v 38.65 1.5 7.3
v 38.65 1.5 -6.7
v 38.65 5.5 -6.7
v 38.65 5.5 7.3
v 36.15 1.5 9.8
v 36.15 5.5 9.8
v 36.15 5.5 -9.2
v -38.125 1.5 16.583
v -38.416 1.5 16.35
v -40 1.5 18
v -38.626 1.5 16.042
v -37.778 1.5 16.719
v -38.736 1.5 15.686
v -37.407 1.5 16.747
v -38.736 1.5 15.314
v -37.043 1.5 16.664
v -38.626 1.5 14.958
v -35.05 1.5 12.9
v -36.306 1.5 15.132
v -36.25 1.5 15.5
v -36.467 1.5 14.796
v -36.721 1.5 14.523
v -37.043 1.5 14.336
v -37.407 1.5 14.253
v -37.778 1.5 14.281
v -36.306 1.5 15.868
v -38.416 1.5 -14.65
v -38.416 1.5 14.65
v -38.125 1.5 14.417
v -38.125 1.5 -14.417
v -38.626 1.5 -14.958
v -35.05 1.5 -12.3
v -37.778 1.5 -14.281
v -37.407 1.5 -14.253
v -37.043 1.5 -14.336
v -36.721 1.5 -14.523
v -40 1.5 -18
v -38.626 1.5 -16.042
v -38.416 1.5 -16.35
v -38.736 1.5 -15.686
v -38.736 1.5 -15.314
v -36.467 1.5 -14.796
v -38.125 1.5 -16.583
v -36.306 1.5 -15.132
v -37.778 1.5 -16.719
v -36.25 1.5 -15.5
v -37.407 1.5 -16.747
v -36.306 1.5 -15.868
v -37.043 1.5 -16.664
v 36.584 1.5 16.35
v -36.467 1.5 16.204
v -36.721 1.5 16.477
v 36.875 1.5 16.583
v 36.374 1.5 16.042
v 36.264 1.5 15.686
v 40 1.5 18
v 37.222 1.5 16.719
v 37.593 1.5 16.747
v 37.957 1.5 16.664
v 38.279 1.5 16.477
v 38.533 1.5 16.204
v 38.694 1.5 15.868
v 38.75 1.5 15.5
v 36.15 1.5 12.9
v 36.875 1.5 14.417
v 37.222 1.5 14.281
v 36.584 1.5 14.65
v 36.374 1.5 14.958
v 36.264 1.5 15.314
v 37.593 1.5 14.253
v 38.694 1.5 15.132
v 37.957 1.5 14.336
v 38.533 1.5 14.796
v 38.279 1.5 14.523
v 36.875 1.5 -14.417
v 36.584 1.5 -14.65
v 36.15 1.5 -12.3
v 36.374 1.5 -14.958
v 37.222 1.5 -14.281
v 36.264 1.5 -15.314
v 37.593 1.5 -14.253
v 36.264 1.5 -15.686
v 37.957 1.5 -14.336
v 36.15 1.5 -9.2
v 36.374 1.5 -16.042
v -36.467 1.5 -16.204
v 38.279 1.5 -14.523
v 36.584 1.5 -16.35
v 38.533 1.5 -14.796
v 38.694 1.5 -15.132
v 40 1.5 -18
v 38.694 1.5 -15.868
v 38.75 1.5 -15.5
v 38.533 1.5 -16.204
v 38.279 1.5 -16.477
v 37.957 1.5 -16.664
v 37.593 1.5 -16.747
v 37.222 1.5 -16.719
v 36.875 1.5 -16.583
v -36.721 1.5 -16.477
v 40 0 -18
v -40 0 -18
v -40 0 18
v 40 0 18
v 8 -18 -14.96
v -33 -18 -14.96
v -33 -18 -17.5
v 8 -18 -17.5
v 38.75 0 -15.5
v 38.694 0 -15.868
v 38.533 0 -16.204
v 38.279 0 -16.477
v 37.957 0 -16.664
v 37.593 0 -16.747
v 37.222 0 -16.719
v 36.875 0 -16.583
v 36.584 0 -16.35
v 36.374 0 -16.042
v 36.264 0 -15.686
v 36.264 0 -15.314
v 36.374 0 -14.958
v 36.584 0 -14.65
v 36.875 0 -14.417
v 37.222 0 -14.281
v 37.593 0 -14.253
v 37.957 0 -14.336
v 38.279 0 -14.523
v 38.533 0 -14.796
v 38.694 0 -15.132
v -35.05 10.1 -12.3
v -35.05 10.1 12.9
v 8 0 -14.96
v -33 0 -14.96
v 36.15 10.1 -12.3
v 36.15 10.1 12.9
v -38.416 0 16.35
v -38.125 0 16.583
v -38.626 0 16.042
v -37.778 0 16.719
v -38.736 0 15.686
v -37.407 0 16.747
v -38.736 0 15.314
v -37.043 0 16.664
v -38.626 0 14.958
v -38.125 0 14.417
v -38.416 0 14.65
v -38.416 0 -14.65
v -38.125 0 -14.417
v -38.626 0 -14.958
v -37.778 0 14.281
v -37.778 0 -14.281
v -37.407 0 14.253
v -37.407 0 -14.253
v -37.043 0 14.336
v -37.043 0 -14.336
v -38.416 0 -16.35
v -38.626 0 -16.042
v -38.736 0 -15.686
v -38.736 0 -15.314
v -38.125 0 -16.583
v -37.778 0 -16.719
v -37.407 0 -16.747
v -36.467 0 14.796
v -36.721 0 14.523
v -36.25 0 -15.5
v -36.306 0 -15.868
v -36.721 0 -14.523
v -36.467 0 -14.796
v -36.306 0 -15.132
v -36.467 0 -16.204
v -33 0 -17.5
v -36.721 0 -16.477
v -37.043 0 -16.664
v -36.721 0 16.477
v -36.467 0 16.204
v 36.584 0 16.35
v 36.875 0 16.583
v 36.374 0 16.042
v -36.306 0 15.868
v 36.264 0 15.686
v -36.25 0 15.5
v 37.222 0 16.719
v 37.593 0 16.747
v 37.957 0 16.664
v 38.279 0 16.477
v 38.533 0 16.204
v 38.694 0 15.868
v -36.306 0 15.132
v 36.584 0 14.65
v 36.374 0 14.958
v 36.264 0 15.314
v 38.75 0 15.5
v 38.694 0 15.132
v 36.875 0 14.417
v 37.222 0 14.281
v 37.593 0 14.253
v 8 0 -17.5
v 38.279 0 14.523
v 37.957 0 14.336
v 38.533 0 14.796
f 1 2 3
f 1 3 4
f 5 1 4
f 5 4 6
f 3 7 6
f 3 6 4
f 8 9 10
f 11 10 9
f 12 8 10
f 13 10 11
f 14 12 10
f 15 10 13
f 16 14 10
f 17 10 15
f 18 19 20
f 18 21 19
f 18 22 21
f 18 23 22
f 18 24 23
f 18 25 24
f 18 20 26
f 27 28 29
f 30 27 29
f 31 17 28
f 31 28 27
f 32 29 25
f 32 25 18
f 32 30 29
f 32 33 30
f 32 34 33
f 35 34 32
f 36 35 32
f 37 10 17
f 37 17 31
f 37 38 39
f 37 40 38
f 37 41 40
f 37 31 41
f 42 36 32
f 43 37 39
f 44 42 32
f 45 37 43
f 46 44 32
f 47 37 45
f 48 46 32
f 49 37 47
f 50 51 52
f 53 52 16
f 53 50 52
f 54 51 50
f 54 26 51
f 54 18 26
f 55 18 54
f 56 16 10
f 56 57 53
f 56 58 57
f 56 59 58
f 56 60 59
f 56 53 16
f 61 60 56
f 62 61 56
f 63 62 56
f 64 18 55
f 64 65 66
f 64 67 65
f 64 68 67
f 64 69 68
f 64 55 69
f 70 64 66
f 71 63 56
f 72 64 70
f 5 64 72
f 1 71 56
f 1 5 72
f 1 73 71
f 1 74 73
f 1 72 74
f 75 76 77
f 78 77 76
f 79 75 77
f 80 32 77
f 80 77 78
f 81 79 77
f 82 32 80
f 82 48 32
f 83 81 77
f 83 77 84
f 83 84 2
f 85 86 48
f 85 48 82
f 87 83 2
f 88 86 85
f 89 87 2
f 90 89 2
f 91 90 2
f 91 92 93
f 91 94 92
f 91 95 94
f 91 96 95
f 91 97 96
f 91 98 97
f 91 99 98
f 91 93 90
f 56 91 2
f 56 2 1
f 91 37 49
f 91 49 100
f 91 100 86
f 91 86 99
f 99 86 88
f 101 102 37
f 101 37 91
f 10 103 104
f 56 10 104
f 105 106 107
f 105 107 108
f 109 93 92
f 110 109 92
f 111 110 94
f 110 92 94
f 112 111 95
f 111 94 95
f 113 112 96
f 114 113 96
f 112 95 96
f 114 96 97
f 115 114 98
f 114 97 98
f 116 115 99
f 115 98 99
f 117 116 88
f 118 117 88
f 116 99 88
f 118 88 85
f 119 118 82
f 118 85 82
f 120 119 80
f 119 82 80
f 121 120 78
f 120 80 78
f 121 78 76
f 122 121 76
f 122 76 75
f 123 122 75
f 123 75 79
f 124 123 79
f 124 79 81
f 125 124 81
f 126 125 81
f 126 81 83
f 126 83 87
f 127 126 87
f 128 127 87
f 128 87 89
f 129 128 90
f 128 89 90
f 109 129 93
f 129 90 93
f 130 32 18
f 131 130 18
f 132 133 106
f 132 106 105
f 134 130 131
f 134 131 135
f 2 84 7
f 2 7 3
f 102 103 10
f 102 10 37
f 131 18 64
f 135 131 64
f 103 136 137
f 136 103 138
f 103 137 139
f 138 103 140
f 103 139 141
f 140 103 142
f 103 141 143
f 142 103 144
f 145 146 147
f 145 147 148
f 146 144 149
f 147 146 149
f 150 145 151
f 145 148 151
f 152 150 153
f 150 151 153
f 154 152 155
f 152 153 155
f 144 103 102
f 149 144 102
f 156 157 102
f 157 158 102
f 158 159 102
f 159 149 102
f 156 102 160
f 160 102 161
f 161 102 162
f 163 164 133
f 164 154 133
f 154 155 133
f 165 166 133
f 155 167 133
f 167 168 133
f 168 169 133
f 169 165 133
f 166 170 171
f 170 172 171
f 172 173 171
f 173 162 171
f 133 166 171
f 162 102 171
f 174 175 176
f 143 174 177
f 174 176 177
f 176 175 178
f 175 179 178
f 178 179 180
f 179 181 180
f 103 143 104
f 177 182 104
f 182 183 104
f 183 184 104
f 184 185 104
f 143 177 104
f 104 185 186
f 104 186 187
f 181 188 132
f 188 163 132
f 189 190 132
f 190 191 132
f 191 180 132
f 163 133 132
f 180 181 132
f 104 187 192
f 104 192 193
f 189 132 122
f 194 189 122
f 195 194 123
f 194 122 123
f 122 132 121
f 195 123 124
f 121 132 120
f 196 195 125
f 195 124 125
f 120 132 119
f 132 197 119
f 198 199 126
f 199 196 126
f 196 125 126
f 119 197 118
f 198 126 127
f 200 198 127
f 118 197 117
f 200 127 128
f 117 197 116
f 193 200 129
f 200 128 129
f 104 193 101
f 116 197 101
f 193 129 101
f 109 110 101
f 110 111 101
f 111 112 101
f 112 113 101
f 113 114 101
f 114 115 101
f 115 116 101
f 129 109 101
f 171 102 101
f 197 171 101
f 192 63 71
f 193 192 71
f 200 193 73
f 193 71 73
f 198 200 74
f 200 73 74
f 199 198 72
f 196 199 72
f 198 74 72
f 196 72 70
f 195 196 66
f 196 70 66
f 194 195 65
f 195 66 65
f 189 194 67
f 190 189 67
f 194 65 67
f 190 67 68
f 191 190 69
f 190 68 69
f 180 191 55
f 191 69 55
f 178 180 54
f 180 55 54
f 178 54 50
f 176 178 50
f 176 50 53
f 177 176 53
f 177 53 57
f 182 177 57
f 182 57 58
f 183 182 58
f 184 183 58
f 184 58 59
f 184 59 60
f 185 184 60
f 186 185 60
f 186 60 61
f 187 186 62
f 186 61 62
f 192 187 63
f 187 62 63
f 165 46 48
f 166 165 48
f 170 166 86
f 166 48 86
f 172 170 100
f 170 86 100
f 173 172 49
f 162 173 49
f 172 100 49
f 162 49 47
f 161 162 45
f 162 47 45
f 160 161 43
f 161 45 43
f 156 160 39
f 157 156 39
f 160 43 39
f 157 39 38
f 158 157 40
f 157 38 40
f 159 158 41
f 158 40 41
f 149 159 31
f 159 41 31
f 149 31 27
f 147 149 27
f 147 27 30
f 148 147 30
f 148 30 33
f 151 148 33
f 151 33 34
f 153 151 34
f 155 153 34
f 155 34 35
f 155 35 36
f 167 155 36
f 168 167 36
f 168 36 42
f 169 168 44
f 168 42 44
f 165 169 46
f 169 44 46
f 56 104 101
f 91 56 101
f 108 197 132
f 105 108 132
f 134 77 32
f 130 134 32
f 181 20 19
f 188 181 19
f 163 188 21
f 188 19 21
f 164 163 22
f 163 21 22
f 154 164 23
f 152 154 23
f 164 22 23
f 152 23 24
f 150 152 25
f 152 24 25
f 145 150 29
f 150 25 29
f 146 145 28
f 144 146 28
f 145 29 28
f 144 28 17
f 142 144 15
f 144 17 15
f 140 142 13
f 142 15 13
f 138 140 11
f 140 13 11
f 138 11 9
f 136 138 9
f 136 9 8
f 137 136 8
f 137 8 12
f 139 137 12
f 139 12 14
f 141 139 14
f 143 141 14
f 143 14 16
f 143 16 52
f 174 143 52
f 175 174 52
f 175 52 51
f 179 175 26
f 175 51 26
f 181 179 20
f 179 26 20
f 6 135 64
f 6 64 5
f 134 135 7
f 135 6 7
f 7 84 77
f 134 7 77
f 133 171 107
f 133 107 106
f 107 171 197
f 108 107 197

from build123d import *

# Parameters (mm, degrees)
SCHIZZO1_W                   = 80
SCHIZZO1_H                   = 36
ESTRUSIONE_ESTRUSIONE1_DEPTH = 1.5
SCHIZZO2_R                   = 1.25
TAGLIO_ESTRUSIONE1_DEPTH     = 1.5
SCHIZZO3_W                   = 71.2
SCHIZZO3_H                   = 25.2
ESTRUSIONE_ESTRUSIONE2_DEPTH = 8.6
ESTRUSIONE_ESTRUSIONE3_DEPTH = 4
SCHIZZO4_W                   = 41
SCHIZZO4_H                   = 2.54
ESTRUSIONE_ESTRUSIONE4_DEPTH = 18


with BuildPart() as part:
    # Schizzo1 → Estrusione-Estrusione1 (new body)
    with BuildSketch(Plane(origin=(0, 0, 0), x_dir=(1, 0, 0), z_dir=(0, 1, 0))):
        Rectangle(SCHIZZO1_W, SCHIZZO1_H)
    extrude(amount=ESTRUSIONE_ESTRUSIONE1_DEPTH)

    # Schizzo2 → Taglio-Estrusione1 (cut)
    with BuildSketch(Plane(origin=(0, 1.5, 0), x_dir=(1, 0, 0), z_dir=(0, 1, 0))):
        with Locations((-37.5, 15.5)):
            Circle(SCHIZZO2_R)
        with Locations((37.5, 15.5)):
            Circle(SCHIZZO2_R)
        with Locations((-37.5, -15.5)):
            Circle(SCHIZZO2_R)
        with Locations((37.5, -15.5)):
            Circle(SCHIZZO2_R)
    extrude(amount=-TAGLIO_ESTRUSIONE1_DEPTH, mode=Mode.SUBTRACT)

    # Schizzo3 → Estrusione-Estrusione2 (add)
    with BuildSketch(Plane(origin=(0, 1.5, 0), x_dir=(1, 0, 0), z_dir=(0, 1, 0))):
        with Locations((0.55, -0.3)):
            Rectangle(SCHIZZO3_W, SCHIZZO3_H)
    extrude(amount=ESTRUSIONE_ESTRUSIONE2_DEPTH)

    # Schizzo3<3> → Estrusione-Estrusione3 (add)
    with BuildSketch(Plane(origin=(0, 1.5, 0), x_dir=(1, 0, 0), z_dir=(0, 1, 0))):
        Polygon((38.65, 6.7), (36.15, 9.2), (36.15, -9.8), (38.65, -7.3), align=None)
    extrude(amount=ESTRUSIONE_ESTRUSIONE3_DEPTH)

    # Schizzo4 → Estrusione-Estrusione4 (add)
    with BuildSketch(Plane.XZ):
        with Locations((-12.5, -16.23)):
            Rectangle(SCHIZZO4_W, SCHIZZO4_H)
    extrude(amount=ESTRUSIONE_ESTRUSIONE4_DEPTH)


solid = part.part
